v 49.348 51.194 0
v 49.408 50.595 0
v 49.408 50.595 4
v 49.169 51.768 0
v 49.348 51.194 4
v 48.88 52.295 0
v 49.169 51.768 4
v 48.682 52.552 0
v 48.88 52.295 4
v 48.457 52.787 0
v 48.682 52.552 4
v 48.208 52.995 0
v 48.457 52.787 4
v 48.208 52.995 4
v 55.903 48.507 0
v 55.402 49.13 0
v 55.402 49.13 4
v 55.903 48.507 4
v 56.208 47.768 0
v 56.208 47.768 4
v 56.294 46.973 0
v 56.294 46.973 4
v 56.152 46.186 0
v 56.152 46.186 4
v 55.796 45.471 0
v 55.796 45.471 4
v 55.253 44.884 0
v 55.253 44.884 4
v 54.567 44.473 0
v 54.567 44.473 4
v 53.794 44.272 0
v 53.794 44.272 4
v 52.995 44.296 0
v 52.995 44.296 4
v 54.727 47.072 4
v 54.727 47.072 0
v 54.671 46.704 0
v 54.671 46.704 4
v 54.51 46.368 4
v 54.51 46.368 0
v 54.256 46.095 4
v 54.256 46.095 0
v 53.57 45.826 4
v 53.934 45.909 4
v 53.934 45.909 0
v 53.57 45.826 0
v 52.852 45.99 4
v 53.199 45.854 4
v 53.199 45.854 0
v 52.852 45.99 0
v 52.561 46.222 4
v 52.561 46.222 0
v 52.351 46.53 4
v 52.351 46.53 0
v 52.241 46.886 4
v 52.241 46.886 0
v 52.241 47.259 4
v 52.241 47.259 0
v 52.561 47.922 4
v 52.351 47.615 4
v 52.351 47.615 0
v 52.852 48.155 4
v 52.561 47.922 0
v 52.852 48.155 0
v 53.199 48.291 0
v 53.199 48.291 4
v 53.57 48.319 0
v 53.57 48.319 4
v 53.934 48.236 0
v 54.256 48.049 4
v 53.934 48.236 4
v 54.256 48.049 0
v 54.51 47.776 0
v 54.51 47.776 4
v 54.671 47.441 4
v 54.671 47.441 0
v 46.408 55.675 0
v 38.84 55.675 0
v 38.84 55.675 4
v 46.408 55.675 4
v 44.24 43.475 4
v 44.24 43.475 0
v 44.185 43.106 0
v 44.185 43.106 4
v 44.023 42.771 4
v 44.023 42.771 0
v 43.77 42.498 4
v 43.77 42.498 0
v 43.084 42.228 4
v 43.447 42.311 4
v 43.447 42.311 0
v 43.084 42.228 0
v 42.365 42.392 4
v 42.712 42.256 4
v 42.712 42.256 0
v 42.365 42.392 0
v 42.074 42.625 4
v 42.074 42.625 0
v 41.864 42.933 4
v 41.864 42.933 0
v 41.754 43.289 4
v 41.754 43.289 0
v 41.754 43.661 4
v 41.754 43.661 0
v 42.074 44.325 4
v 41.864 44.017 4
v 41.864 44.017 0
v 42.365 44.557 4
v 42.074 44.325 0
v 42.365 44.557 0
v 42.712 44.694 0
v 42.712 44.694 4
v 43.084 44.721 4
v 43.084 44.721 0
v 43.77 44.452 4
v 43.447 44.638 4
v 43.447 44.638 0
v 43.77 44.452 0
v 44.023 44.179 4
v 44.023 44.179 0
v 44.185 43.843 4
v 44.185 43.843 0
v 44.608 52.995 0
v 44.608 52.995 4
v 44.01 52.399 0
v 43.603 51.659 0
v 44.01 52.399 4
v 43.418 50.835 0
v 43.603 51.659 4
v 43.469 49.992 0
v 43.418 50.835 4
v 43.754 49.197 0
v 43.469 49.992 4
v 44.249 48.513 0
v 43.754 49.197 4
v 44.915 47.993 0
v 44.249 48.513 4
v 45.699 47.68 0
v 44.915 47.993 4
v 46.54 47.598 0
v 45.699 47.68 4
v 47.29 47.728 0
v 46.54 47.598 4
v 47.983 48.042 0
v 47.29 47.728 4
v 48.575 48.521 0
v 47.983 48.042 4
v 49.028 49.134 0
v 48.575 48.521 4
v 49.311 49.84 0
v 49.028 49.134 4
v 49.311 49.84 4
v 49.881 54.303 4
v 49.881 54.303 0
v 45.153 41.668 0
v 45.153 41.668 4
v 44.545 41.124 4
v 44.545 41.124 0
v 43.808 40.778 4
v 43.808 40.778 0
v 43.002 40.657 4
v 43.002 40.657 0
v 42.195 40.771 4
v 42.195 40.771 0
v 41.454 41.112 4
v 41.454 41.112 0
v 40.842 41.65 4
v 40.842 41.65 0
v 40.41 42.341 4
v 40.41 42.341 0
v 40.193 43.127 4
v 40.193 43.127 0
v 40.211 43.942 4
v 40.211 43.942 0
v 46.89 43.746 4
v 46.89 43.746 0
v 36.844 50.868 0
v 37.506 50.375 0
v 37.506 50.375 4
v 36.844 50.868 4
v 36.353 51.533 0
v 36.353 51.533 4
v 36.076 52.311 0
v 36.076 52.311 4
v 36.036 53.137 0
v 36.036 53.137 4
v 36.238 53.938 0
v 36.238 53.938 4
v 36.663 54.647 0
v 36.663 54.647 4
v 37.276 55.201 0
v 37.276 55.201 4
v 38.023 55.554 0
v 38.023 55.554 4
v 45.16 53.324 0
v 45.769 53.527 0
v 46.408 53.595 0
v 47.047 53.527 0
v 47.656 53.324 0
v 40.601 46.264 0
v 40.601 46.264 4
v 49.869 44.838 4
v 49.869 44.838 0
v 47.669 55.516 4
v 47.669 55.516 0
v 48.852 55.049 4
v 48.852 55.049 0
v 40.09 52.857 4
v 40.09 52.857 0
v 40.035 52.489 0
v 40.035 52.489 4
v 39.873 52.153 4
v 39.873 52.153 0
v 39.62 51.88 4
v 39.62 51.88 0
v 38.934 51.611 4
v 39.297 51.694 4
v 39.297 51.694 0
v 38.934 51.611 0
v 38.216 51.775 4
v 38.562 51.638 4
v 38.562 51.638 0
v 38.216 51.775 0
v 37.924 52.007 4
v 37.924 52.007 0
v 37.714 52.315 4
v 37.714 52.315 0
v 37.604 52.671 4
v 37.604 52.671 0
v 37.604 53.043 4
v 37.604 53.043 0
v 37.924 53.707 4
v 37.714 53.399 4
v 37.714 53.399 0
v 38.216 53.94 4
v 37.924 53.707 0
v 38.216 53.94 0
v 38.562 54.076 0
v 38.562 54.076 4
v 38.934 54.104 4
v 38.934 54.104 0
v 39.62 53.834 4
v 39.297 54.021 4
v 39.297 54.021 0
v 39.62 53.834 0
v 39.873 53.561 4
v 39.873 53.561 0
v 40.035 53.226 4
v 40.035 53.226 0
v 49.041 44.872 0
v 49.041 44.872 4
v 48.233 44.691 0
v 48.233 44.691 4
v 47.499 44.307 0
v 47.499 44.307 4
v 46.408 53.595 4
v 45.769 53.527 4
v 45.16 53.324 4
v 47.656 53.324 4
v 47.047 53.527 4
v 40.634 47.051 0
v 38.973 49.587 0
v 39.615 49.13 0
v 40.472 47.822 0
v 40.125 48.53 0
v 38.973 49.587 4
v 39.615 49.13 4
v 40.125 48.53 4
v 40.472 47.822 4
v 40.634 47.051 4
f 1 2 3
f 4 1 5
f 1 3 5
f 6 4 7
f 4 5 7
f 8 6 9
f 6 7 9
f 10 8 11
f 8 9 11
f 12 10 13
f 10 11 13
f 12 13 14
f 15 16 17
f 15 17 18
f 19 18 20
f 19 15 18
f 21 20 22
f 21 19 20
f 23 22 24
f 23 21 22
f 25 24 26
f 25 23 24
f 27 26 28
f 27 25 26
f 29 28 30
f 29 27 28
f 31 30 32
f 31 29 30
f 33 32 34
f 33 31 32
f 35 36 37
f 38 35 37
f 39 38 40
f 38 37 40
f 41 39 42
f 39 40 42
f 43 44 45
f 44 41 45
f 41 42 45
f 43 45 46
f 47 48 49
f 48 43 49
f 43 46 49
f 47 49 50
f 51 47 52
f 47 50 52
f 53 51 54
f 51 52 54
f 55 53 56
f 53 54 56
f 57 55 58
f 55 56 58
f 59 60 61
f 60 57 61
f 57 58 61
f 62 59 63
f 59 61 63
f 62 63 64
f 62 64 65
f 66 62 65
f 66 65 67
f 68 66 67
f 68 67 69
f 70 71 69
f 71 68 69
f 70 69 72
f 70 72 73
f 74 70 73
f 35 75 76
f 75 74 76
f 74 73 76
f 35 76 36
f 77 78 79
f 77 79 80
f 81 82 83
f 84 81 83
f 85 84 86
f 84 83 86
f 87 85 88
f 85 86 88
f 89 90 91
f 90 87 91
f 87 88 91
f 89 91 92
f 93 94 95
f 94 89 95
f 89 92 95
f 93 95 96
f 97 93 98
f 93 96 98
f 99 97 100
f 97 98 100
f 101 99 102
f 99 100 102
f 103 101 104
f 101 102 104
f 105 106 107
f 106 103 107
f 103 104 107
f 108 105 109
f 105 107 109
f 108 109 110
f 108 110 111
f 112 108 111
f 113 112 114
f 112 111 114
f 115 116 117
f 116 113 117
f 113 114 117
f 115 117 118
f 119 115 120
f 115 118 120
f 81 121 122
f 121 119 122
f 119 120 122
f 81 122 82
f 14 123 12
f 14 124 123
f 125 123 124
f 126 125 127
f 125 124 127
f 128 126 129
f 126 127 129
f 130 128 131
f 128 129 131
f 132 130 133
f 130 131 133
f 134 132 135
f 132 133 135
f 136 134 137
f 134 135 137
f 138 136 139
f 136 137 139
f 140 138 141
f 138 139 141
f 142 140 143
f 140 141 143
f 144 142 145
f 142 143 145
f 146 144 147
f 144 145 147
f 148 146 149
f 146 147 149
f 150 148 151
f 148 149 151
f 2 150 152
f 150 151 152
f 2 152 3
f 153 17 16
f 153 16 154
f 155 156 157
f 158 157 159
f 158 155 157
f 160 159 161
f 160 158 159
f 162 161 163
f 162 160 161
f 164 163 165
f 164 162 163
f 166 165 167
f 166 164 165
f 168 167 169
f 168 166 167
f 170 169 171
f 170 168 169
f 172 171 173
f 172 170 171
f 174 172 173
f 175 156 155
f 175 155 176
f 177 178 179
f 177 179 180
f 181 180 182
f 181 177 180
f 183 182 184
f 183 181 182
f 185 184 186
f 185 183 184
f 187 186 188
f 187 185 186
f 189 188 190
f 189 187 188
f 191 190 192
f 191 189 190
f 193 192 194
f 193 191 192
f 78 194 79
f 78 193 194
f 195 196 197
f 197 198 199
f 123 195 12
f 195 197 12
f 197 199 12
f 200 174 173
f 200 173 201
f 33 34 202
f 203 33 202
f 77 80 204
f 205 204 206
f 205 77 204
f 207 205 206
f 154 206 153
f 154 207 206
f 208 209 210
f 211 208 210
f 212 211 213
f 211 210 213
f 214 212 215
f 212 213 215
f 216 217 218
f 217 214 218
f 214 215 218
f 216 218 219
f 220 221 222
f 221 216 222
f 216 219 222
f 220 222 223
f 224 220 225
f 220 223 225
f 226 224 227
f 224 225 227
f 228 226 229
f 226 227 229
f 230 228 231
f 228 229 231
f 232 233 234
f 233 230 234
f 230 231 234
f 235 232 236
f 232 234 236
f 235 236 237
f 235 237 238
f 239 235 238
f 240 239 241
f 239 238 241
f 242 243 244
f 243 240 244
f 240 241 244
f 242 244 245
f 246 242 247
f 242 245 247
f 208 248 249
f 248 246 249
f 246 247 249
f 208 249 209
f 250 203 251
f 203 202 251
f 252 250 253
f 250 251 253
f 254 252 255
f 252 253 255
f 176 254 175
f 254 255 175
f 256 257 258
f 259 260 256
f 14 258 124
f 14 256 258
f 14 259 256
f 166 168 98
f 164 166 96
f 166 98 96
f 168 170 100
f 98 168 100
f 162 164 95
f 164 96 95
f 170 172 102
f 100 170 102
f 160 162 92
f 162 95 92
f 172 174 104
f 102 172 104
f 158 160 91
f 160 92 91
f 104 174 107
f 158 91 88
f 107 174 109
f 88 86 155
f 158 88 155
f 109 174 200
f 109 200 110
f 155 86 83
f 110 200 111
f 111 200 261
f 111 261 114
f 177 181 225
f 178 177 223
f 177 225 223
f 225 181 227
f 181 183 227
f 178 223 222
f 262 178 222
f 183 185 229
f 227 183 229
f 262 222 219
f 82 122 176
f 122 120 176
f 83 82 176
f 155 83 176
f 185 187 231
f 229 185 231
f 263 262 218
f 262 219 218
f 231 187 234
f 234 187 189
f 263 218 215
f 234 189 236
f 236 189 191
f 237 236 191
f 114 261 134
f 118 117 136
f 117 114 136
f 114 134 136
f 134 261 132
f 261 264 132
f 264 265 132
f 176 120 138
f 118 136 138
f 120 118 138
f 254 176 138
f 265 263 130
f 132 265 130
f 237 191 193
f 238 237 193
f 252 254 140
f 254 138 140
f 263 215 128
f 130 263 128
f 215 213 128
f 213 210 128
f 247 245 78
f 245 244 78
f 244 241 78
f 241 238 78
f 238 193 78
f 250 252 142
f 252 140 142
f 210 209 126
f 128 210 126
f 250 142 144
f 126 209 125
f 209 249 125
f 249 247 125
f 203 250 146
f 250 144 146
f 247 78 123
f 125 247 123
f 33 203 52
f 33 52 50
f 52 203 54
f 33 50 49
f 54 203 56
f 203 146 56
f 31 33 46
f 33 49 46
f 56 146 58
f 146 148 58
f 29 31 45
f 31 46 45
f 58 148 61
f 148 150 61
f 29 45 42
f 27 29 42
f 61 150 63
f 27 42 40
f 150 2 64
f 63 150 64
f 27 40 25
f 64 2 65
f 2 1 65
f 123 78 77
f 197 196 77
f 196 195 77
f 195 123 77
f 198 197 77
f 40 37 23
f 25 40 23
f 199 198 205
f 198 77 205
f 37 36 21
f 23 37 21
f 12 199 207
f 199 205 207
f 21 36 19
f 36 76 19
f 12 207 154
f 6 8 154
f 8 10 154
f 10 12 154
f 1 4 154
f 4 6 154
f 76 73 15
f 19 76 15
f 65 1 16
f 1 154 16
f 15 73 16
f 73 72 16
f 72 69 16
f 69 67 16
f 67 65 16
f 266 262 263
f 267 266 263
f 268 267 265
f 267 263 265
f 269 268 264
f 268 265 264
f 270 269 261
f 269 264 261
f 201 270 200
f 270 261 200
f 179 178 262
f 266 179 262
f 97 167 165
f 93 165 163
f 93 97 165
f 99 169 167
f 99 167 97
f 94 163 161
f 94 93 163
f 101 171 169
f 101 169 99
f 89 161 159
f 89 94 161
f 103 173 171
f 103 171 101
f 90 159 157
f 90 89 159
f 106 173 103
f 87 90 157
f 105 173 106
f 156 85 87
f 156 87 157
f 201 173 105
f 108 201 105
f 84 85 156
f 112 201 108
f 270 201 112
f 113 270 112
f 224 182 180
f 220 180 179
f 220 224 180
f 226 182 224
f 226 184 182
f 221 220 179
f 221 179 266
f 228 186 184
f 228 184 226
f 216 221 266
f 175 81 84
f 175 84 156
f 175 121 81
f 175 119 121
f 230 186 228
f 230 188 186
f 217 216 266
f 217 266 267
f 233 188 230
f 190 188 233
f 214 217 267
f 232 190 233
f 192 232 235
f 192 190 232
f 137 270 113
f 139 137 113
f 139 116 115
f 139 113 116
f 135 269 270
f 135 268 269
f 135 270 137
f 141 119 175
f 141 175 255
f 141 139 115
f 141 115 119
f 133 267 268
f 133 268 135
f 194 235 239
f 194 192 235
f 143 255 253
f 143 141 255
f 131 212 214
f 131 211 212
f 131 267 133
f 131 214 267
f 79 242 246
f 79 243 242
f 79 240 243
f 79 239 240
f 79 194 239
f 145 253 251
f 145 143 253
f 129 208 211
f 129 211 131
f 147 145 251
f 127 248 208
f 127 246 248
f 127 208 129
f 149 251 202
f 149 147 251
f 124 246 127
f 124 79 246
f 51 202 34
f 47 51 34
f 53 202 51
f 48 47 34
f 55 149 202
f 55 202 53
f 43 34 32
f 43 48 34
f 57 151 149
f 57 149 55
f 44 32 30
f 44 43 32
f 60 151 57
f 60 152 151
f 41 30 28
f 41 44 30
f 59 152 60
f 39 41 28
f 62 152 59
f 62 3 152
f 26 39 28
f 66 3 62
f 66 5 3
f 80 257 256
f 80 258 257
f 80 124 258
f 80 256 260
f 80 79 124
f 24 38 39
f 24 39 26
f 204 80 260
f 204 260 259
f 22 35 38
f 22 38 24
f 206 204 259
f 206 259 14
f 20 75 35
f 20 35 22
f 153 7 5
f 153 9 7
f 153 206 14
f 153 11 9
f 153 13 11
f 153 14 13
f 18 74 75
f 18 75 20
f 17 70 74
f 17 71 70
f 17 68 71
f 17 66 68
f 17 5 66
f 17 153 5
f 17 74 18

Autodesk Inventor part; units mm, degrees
ref_plane "YZ Plane" through (0, 0, 0) normal (1, 0, 0) x (0, 1, 0)
ref_plane "XZ Plane" through (0, 0, 0) normal (0, 1, 0) x (-1, 0, 0)
ref_plane "XY Plane" through (0, 0, 0) normal (0, 0, 1) x (1, 0, 0)
sketch "Sketch2" plane through (0, 0, 0) normal (0, 0, 1) x (1, 0, 0)
  circle A0 centre (46.408, 50.5954) radius 3.175 construction
  circle A1 centre (46.408, 50.5954) radius 5.08
  line L0 (46.408, 50.5954) -> (38.8405, 52.8571) construction
  line L1 (46.408, 50.5954) -> (53.477, 47.0722) construction
  circle A2 centre (38.8405, 52.8571) radius 2.8183
  circle A3 centre (53.477, 47.0722) radius 2.8183
  circle A4 centre (38.8405, 52.8571) radius 1.25
  circle A5 centre (53.477, 47.0722) radius 1.25
  line L2 (38.8405, 55.6754) -> (46.408, 55.6754)
  line L3 (37.5063, 50.3746) -> (42.0976, 47.9072)
  line L4 (55.4024, 49.1303) -> (50.0414, 54.1458)
  line L5 (52.3888, 44.4725) -> (48.6507, 46.0372)
  circle A6 centre (46.408, 50.5954) radius 3
  circle A7 centre (46.408, 50.5954) radius 4.2333 construction
  line L6 (46.408, 50.5954) -> (42.9902, 43.4749) construction
  circle A8 centre (42.9902, 43.4749) radius 1.25
  circle A9 centre (42.9902, 43.4749) radius 2.8183
  line L7 (40.2199, 43.993) -> (41.3557, 50.0663)
  line L8 (45.2023, 41.7287) -> (48.5744, 46.0005)
  point P0 (0, 0)
  dimension "d7" = 10.16
  dimension "d8" = 2.5
  dimension "d9" = 6
  dimension "d10" = 8.4667
extrude "Plate2" add sketch "Sketch2" along normal blind 4 contours A1 | A3 | A1 A2 L2 | A1 L7 L3 A2 | A2 | A1 L3 L7 | A9
sketch "Sketch3" plane through (0, 0, 4) normal (0, 0, 1) x (1, 0, 0)
  arc A0 (42.0976, 47.9072) -> (44.2097, 46.0157) centre (46.408, 50.5954) ccw
  circle A1 centre (46.408, 50.5954) radius 5.08
  circle A2 centre (42.9902, 43.4749) radius 2.8183
  line L0 (40.2108, 43.9416) -> (41.328, 50.5954)
  line L1 (45.1528, 41.6677) -> (48.9266, 46.1837)
  arc A3 (44.2097, 46.0157) -> (50.9546, 48.3294) centre (46.408, 50.5954) ccw
  point P0 (0, 0)
sheet face with bend "Face3" sketch "Sketch3" thickness 4 toward (0, 0, -1) bend radius 4 contours A0 A2 L0 A1 | A1 L1 A2
bend "Bend1"
sketch "Sketch4" plane through (0, 0, 4) normal (0, 0, 1) x (1, 0, 0)
  arc A0 (50.9546, 48.3294) -> (46.408, 55.6754) centre (46.408, 50.5954) ccw
  arc A1 (50.9546, 48.3294) -> (46.408, 55.6754) centre (46.408, 50.5954) ccw
  circle A2 centre (46.408, 50.5954) radius 5.08
  circle A3 centre (53.477, 47.0722) radius 2.8183
  line L0 (55.4038, 49.129) -> (49.8811, 54.3027)
  line L1 (52.9948, 44.2955) -> (45.5388, 45.5903)
  arc A4 (44.2097, 46.0157) -> (50.9546, 48.3294) centre (46.408, 50.5954) ccw
  line L2 (49.8811, 54.3027) -> (45.5388, 45.5903)
  point P0 (0, 0)
sheet face with bend "Face4" sketch "Sketch4" thickness 4 toward (0, 0, -1) bend radius 4 picked at (48.6605, 51.1377) contours A2 L2 A0 | A3 L1 A2 | A0 L0 A3
bend "Bend2"
sketch "Sketch5" plane through (0, 0, 4) normal (0, 0, 1) x (1, 0, 0)
  arc A0 (48.8803, 52.2948) -> (46.5396, 47.5983) centre (46.408, 50.5954) ccw projected
  arc A1 (48.8803, 52.2948) -> (46.5396, 47.5983) centre (46.408, 50.5954) ccw projected
  circle A2 centre (46.408, 50.5954) radius 3
  point P0 (0, 0)
  point P1 (46.5396, 47.5983)
extrude "Extrusion1" cut sketch "Sketch5" against normal blind 25.4
fillet "Fillet1" radius 3.175 2 edges at (40.9777, 48.509, 2) (48.0642, 45.1518, 2)
sketch "Sketch6" plane through (0, 0, 4) normal (0, 0, 1) x (1, 0, 0)
  circle A0 centre (46.408, 50.5954) radius 3 projected
  line L0 (43.408, 53.5954) -> (49.408, 53.5954)
  line L1 (49.408, 53.5954) -> (49.408, 47.5954)
  line L2 (49.408, 47.5954) -> (43.408, 47.5954)
  line L3 (43.408, 47.5954) -> (43.408, 53.5954)
  line L4 (43.408, 52.9954) -> (49.408, 52.9954)
  point P0 (0, 0)
  point P1 (44.608, 52.9954)
  point P2 (48.208, 52.9954)
  dimension "d26" = 5.4
extrude "Extrusion2" add sketch "Sketch6" against normal up to surface (4 mm away) contours L4 A0 picked at (46.6209, 53.1725)
equation "\"d12\" = Thickness"
equation "\"d13\" = BendRadius"
equation "\"d14\" = BendReliefWidth"
equation "\"d16\" = MinimumRemnant"
equation "\"d15\" = BendReliefDepth"
equation "\"d17\" = TransitionRadius"
equation "\"d18\" = BendRadius"
equation "\"d19\" = BendReliefWidth"
equation "\"d21\" = MinimumRemnant"
equation "\"d20\" = BendReliefDepth"
equation "\"d22\" = TransitionRadius"
equation "\"BendRadius\" = Thickness"
equation "\"BendReliefWidth\" = Thickness"
equation "\"BendReliefDepth\" = 0.5 * Thickness"
equation "\"CornerReliefSize\" = 4 * Thickness"
equation "\"MinimumRemnant\" = 2 * Thickness"
equation "\"TransitionRadius\" = BendRadius"
equation "\"JacobiRadiusSize\" = BendRadius"
equation "\"GapSize\" = Thickness"
equation "\"Thickness\" = 4"
properties part number "ShaftLock"
